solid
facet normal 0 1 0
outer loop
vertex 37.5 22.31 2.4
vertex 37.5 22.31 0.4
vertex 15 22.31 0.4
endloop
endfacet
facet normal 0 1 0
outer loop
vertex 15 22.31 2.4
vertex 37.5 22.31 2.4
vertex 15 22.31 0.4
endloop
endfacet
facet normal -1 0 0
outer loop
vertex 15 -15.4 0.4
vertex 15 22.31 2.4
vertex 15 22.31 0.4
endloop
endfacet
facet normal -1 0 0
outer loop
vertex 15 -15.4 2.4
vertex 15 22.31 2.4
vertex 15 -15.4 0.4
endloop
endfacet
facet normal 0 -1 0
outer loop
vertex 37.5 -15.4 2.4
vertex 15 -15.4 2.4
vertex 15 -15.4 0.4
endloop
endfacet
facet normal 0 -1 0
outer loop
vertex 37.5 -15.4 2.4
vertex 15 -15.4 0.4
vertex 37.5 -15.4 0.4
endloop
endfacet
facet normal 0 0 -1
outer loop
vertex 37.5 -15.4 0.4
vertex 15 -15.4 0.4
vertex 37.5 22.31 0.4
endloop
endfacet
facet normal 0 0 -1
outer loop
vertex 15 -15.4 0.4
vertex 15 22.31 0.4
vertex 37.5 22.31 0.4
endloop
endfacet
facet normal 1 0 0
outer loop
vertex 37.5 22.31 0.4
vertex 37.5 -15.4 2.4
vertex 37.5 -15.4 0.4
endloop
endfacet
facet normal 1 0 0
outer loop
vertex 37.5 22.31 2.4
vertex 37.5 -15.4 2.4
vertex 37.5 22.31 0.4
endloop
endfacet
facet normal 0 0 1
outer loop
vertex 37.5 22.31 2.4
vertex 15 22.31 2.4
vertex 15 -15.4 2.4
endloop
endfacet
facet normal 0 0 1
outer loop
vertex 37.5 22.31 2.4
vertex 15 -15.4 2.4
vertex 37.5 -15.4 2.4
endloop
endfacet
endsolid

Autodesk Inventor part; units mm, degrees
ref_plane "YZ Plane" through (0, 0, 0) normal (1, 0, 0) x (0, 1, 0)
ref_plane "XZ Plane" through (0, 0, 0) normal (0, 1, 0) x (-1, 0, 0)
ref_plane "XY Plane" through (0, 0, 0) normal (0, 0, 1) x (1, 0, 0)
sketch "Sketch1" plane through (0, 0, 0) normal (0, 0, 1) x (1, 0, 0)
  circle A0 centre (7.5, -12.2) radius 1.75 projected
  circle A1 centre (-7.5, -12.2) radius 1.75 projected
  line L0 (-15, -5.24) -> (-12.5, -5.24) projected
  arc A2 (-12.5, -10.24) -> (-12.5, -5.24) centre (-12.5, -7.74) ccw projected
  line L1 (-12.5, -10.24) -> (-15, -10.24) projected
  line L2 (-15, -10.24) -> (-15, -5.24) projected
  line L3 (12.5, -5.24) -> (15, -5.24) projected
  line L4 (15, -5.24) -> (15, -10.24) projected
  line L5 (15, -10.24) -> (12.5, -10.24) projected
  arc A3 (12.5, -5.24) -> (12.5, -10.24) centre (12.5, -7.74) ccw projected
  line L6 (37.5, -15.4) -> (37.5, 31.2121) projected
  line L7 (37.5, 31.2121) -> (14.8602, 31.2121) projected
  line L8 (14.8602, 31.2121) -> (14.8602, 15.1552) projected
  line L9 (14.8602, 15.1552) -> (2.8777, -5.8186) projected
  line L10 (2.8777, -5.8186) -> (-2.8777, -5.8186) projected
  line L11 (-2.8777, -5.8186) -> (-15, 15.4) projected
  line L12 (-15, 15.4) -> (-15, 31.2121) projected
  line L13 (-15, 31.2121) -> (-37.5, 31.2121) projected
  line L14 (-37.5, 31.2121) -> (-37.5, -15.4) projected
  line L15 (-37.5, -15.4) -> (37.5, -15.4) projected
  line L16 (44, 22.1656) -> (44, -5.24) projected
  line L17 (44, 3.8199) -> (40.2471, -6.356) projected
  line L18 (40.2471, -9.1241) -> (44, -19.3) projected
  line L19 (50, 15.6109) -> (-50, 15.6109) projected
  line L20 (50, 15.6109) -> (-50, 15.6109) projected
  line L21 (-14.8795, 22.2639) -> (-42.2795, 22.2397) projected
  line L22 (-21.0553, -5.1415) -> (-14.8553, -5.136) projected
  line L23 (17.7513, -5.24) -> (37.5, -5.24)
  line L24 (37.5, -5.24) -> (37.5, 22.3103)
  line L25 (37.5, 22.3103) -> (17.7513, 22.3103)
  line L26 (17.7513, 22.3103) -> (17.7513, -5.24)
  line L27 (37.5, 22.3103) -> (15, 22.3103)
  line L28 (15, 22.3103) -> (15, -5.24)
  line L29 (15, -5.24) -> (37.5, -5.24)
  line L30 (37.5, -5.24) -> (37.5, 22.3103)
  point P0 (0, 0)
extrude "Extrusion1" add sketch "Sketch1" along normal blind 2.4 contours L28 L19 L26 L29 | L28 L27 L26 L19 | L26 L19 L6 L23 | L26 L25 L6 L19
sketch "Sketch2" plane through (0, 0, 0) normal (0, 0, -1) x (-1, 0, 0)
  line L0 (-15, -5.24) -> (-37.5, -5.24) projected
  line L1 (-37.5, -5.24) -> (-37.5, 22.3103) projected
  line L2 (-37.5, 22.3103) -> (-15, 22.3103) projected
  line L3 (-15, 22.3103) -> (-15, -5.24) projected
  point P0 (0, 0)
extrude "Extrusion2" cut sketch "Sketch2" against normal blind 0.4
sketch "Sketch3" plane through (0, 0, 2.4) normal (0, 0, 1) x (1, 0, 0)
  line L0 (15, -5.24) -> (37.5, -5.24) projected
  line L1 (37.5, -5.24) -> (37.5, 22.3103) projected
  line L2 (37.5, 22.3103) -> (15, 22.3103) projected
  line L3 (15, 22.3103) -> (15, -5.24) projected
  circle A0 centre (7.5, -12.2) radius 1.75 projected
  circle A1 centre (-7.5, -12.2) radius 1.75 projected
  line L4 (-15, -5.24) -> (-12.5, -5.24) projected
  arc A2 (-12.5, -10.24) -> (-12.5, -5.24) centre (-12.5, -7.74) ccw projected
  line L5 (-12.5, -10.24) -> (-15, -10.24) projected
  line L6 (-15, -10.24) -> (-15, -5.24) projected
  line L7 (12.5, -5.24) -> (15, -5.24) projected
  line L8 (15, -5.24) -> (15, -10.24) projected
  line L9 (15, -10.24) -> (12.5, -10.24) projected
  arc A3 (12.5, -5.24) -> (12.5, -10.24) centre (12.5, -7.74) ccw projected
  line L10 (37.5, -15.4) -> (37.5, 31.2121) projected
  line L11 (37.5, 31.2121) -> (14.8602, 31.2121) projected
  line L12 (14.8602, 31.2121) -> (14.8602, 15.1552) projected
  line L13 (14.8602, 15.1552) -> (2.8777, -5.8186) projected
  line L14 (2.8777, -5.8186) -> (-2.8777, -5.8186) projected
  line L15 (-2.8777, -5.8186) -> (-15, 15.4) projected
  line L16 (-15, 15.4) -> (-15, 31.2121) projected
  line L17 (-15, 31.2121) -> (-37.5, 31.2121) projected
  line L18 (-37.5, 31.2121) -> (-37.5, -15.4) projected
  line L19 (-37.5, -15.4) -> (37.5, -15.4) projected
  line L20 (37.5, -5.24) -> (15, -5.24)
  line L21 (15, -5.24) -> (15, -15.4)
  line L22 (15, -15.4) -> (37.5, -15.4)
  line L23 (37.5, -15.4) -> (37.5, -5.24)
  point P0 (0, 0)
extrude "Extrusion3" add sketch "Sketch3" against normal blind 2 contours L0 L10 L19 L21 L8
properties part number "PCB_2"
